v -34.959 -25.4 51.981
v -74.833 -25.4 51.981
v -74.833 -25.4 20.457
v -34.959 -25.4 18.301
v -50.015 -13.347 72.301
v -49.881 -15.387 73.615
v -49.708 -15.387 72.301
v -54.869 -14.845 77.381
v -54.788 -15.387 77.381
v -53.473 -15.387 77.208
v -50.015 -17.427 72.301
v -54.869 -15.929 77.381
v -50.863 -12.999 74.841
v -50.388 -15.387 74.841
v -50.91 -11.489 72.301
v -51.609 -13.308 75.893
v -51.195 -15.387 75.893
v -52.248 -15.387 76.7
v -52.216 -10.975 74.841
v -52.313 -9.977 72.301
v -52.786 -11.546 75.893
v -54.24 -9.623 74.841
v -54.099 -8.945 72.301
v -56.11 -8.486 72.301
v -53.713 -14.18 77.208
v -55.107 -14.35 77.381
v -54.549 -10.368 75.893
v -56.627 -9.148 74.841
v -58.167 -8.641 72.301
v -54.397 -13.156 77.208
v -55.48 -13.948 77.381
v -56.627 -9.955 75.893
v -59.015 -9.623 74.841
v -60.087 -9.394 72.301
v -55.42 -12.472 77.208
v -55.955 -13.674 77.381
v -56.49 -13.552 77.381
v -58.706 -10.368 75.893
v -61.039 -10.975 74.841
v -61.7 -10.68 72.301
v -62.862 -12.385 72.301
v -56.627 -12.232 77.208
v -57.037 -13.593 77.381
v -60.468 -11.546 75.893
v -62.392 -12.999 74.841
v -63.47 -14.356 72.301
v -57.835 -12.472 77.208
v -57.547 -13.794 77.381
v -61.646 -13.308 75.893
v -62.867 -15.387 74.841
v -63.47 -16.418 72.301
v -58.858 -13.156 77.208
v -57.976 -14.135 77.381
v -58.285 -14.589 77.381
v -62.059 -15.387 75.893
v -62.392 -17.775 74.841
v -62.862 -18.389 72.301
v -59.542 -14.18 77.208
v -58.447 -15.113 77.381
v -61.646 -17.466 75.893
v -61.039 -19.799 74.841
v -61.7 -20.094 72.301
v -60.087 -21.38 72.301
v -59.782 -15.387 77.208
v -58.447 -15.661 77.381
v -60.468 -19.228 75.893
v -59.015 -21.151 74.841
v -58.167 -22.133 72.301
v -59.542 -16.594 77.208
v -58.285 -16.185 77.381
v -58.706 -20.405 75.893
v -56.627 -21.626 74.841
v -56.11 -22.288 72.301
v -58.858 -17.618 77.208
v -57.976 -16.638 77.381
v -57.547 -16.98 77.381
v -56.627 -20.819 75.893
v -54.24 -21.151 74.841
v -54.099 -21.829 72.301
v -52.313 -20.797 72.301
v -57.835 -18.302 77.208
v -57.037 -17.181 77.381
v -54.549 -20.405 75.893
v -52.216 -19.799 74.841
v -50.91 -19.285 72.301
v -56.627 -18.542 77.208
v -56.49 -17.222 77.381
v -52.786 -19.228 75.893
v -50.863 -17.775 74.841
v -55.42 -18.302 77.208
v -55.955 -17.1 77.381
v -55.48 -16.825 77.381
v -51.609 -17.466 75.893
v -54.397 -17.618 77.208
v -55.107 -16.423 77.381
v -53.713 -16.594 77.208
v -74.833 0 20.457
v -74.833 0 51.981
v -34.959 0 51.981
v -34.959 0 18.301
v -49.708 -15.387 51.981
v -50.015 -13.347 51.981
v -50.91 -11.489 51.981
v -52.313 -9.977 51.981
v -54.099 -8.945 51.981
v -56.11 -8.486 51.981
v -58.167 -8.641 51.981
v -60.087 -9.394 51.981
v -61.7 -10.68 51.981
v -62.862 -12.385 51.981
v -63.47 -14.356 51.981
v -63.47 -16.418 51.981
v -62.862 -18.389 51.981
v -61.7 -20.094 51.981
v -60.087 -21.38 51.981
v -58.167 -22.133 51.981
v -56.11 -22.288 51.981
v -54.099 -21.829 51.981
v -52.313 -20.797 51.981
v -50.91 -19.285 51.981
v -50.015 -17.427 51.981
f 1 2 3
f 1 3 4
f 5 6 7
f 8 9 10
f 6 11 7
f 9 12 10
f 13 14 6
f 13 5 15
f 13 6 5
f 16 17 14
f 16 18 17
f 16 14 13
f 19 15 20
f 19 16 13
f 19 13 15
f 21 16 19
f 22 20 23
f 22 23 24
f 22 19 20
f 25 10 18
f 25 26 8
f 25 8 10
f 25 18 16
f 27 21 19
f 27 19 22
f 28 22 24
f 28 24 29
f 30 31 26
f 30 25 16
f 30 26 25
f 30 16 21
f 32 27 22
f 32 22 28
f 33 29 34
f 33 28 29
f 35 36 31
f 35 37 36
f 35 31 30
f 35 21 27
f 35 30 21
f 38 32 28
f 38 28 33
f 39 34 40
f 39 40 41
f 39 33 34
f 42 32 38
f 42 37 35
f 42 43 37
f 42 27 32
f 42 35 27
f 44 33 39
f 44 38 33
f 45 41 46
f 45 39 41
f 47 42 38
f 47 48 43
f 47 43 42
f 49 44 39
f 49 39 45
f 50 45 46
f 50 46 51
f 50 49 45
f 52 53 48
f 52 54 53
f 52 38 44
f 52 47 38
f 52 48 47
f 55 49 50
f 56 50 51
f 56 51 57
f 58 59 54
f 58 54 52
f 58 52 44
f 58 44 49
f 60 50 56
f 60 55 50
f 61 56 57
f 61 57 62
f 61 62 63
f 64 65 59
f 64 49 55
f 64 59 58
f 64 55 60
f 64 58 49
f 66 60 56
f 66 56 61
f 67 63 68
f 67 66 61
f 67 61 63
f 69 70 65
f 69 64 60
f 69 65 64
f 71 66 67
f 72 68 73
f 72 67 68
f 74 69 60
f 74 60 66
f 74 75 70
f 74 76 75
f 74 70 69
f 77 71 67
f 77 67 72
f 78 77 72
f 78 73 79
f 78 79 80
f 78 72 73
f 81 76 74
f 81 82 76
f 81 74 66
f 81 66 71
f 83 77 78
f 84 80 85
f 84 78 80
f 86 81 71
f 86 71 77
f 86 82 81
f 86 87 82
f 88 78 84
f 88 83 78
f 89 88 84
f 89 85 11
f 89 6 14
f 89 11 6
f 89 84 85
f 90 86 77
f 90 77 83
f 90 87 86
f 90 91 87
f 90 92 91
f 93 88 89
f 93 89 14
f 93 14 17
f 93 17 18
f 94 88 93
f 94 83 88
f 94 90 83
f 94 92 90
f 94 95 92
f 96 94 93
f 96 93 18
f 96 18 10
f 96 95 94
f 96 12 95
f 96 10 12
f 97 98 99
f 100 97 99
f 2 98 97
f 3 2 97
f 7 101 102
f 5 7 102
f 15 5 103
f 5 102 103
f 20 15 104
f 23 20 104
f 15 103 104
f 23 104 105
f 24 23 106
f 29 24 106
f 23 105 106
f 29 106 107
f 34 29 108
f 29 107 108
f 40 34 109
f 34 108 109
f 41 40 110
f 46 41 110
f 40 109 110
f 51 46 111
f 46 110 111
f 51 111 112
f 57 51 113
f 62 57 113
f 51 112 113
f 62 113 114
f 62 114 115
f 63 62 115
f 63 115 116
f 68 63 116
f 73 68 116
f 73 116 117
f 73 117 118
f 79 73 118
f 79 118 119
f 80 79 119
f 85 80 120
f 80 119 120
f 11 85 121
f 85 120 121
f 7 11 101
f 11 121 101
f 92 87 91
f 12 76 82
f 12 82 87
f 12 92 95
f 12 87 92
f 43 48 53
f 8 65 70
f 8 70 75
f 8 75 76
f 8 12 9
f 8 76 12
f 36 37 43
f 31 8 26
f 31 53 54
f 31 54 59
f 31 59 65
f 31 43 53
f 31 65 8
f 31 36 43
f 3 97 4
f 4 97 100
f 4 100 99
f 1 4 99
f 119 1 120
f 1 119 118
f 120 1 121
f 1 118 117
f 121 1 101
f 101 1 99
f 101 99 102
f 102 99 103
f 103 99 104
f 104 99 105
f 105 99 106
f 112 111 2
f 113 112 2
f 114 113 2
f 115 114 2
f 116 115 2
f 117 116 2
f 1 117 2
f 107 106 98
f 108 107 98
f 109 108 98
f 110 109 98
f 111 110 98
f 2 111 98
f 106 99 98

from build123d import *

# Parameters (mm, degrees)
F1_DEPTH = 25.4
F2_R     = 6.91991
F3_DEPTH = 25.4
F4_R     = 5.08


with BuildPart() as f1:
    # F0 (on Front) → F1 (new body)
    with BuildSketch(Plane.XZ):
        Polygon((-74.833319, 51.980667), (-74.833319, 20.457085), (-34.958635, 18.300878), (-34.958635, 51.980667), align=None)
    extrude(amount=F1_DEPTH)

    # F2 (on face) → F3 (join)
    with BuildSketch(Plane.XY.offset(51.980667)):
        with Locations((-56.627482, -15.38695)):
            Circle(F2_R)
    extrude(amount=F3_DEPTH)

    # F4
    f4_edges = [f1.edges().sort_by_distance(p)[0] for p in [
        (-63.547392, -15.38695, 77.380667),
    ]]
    fillet(f4_edges, radius=F4_R)


solid = f1.part
